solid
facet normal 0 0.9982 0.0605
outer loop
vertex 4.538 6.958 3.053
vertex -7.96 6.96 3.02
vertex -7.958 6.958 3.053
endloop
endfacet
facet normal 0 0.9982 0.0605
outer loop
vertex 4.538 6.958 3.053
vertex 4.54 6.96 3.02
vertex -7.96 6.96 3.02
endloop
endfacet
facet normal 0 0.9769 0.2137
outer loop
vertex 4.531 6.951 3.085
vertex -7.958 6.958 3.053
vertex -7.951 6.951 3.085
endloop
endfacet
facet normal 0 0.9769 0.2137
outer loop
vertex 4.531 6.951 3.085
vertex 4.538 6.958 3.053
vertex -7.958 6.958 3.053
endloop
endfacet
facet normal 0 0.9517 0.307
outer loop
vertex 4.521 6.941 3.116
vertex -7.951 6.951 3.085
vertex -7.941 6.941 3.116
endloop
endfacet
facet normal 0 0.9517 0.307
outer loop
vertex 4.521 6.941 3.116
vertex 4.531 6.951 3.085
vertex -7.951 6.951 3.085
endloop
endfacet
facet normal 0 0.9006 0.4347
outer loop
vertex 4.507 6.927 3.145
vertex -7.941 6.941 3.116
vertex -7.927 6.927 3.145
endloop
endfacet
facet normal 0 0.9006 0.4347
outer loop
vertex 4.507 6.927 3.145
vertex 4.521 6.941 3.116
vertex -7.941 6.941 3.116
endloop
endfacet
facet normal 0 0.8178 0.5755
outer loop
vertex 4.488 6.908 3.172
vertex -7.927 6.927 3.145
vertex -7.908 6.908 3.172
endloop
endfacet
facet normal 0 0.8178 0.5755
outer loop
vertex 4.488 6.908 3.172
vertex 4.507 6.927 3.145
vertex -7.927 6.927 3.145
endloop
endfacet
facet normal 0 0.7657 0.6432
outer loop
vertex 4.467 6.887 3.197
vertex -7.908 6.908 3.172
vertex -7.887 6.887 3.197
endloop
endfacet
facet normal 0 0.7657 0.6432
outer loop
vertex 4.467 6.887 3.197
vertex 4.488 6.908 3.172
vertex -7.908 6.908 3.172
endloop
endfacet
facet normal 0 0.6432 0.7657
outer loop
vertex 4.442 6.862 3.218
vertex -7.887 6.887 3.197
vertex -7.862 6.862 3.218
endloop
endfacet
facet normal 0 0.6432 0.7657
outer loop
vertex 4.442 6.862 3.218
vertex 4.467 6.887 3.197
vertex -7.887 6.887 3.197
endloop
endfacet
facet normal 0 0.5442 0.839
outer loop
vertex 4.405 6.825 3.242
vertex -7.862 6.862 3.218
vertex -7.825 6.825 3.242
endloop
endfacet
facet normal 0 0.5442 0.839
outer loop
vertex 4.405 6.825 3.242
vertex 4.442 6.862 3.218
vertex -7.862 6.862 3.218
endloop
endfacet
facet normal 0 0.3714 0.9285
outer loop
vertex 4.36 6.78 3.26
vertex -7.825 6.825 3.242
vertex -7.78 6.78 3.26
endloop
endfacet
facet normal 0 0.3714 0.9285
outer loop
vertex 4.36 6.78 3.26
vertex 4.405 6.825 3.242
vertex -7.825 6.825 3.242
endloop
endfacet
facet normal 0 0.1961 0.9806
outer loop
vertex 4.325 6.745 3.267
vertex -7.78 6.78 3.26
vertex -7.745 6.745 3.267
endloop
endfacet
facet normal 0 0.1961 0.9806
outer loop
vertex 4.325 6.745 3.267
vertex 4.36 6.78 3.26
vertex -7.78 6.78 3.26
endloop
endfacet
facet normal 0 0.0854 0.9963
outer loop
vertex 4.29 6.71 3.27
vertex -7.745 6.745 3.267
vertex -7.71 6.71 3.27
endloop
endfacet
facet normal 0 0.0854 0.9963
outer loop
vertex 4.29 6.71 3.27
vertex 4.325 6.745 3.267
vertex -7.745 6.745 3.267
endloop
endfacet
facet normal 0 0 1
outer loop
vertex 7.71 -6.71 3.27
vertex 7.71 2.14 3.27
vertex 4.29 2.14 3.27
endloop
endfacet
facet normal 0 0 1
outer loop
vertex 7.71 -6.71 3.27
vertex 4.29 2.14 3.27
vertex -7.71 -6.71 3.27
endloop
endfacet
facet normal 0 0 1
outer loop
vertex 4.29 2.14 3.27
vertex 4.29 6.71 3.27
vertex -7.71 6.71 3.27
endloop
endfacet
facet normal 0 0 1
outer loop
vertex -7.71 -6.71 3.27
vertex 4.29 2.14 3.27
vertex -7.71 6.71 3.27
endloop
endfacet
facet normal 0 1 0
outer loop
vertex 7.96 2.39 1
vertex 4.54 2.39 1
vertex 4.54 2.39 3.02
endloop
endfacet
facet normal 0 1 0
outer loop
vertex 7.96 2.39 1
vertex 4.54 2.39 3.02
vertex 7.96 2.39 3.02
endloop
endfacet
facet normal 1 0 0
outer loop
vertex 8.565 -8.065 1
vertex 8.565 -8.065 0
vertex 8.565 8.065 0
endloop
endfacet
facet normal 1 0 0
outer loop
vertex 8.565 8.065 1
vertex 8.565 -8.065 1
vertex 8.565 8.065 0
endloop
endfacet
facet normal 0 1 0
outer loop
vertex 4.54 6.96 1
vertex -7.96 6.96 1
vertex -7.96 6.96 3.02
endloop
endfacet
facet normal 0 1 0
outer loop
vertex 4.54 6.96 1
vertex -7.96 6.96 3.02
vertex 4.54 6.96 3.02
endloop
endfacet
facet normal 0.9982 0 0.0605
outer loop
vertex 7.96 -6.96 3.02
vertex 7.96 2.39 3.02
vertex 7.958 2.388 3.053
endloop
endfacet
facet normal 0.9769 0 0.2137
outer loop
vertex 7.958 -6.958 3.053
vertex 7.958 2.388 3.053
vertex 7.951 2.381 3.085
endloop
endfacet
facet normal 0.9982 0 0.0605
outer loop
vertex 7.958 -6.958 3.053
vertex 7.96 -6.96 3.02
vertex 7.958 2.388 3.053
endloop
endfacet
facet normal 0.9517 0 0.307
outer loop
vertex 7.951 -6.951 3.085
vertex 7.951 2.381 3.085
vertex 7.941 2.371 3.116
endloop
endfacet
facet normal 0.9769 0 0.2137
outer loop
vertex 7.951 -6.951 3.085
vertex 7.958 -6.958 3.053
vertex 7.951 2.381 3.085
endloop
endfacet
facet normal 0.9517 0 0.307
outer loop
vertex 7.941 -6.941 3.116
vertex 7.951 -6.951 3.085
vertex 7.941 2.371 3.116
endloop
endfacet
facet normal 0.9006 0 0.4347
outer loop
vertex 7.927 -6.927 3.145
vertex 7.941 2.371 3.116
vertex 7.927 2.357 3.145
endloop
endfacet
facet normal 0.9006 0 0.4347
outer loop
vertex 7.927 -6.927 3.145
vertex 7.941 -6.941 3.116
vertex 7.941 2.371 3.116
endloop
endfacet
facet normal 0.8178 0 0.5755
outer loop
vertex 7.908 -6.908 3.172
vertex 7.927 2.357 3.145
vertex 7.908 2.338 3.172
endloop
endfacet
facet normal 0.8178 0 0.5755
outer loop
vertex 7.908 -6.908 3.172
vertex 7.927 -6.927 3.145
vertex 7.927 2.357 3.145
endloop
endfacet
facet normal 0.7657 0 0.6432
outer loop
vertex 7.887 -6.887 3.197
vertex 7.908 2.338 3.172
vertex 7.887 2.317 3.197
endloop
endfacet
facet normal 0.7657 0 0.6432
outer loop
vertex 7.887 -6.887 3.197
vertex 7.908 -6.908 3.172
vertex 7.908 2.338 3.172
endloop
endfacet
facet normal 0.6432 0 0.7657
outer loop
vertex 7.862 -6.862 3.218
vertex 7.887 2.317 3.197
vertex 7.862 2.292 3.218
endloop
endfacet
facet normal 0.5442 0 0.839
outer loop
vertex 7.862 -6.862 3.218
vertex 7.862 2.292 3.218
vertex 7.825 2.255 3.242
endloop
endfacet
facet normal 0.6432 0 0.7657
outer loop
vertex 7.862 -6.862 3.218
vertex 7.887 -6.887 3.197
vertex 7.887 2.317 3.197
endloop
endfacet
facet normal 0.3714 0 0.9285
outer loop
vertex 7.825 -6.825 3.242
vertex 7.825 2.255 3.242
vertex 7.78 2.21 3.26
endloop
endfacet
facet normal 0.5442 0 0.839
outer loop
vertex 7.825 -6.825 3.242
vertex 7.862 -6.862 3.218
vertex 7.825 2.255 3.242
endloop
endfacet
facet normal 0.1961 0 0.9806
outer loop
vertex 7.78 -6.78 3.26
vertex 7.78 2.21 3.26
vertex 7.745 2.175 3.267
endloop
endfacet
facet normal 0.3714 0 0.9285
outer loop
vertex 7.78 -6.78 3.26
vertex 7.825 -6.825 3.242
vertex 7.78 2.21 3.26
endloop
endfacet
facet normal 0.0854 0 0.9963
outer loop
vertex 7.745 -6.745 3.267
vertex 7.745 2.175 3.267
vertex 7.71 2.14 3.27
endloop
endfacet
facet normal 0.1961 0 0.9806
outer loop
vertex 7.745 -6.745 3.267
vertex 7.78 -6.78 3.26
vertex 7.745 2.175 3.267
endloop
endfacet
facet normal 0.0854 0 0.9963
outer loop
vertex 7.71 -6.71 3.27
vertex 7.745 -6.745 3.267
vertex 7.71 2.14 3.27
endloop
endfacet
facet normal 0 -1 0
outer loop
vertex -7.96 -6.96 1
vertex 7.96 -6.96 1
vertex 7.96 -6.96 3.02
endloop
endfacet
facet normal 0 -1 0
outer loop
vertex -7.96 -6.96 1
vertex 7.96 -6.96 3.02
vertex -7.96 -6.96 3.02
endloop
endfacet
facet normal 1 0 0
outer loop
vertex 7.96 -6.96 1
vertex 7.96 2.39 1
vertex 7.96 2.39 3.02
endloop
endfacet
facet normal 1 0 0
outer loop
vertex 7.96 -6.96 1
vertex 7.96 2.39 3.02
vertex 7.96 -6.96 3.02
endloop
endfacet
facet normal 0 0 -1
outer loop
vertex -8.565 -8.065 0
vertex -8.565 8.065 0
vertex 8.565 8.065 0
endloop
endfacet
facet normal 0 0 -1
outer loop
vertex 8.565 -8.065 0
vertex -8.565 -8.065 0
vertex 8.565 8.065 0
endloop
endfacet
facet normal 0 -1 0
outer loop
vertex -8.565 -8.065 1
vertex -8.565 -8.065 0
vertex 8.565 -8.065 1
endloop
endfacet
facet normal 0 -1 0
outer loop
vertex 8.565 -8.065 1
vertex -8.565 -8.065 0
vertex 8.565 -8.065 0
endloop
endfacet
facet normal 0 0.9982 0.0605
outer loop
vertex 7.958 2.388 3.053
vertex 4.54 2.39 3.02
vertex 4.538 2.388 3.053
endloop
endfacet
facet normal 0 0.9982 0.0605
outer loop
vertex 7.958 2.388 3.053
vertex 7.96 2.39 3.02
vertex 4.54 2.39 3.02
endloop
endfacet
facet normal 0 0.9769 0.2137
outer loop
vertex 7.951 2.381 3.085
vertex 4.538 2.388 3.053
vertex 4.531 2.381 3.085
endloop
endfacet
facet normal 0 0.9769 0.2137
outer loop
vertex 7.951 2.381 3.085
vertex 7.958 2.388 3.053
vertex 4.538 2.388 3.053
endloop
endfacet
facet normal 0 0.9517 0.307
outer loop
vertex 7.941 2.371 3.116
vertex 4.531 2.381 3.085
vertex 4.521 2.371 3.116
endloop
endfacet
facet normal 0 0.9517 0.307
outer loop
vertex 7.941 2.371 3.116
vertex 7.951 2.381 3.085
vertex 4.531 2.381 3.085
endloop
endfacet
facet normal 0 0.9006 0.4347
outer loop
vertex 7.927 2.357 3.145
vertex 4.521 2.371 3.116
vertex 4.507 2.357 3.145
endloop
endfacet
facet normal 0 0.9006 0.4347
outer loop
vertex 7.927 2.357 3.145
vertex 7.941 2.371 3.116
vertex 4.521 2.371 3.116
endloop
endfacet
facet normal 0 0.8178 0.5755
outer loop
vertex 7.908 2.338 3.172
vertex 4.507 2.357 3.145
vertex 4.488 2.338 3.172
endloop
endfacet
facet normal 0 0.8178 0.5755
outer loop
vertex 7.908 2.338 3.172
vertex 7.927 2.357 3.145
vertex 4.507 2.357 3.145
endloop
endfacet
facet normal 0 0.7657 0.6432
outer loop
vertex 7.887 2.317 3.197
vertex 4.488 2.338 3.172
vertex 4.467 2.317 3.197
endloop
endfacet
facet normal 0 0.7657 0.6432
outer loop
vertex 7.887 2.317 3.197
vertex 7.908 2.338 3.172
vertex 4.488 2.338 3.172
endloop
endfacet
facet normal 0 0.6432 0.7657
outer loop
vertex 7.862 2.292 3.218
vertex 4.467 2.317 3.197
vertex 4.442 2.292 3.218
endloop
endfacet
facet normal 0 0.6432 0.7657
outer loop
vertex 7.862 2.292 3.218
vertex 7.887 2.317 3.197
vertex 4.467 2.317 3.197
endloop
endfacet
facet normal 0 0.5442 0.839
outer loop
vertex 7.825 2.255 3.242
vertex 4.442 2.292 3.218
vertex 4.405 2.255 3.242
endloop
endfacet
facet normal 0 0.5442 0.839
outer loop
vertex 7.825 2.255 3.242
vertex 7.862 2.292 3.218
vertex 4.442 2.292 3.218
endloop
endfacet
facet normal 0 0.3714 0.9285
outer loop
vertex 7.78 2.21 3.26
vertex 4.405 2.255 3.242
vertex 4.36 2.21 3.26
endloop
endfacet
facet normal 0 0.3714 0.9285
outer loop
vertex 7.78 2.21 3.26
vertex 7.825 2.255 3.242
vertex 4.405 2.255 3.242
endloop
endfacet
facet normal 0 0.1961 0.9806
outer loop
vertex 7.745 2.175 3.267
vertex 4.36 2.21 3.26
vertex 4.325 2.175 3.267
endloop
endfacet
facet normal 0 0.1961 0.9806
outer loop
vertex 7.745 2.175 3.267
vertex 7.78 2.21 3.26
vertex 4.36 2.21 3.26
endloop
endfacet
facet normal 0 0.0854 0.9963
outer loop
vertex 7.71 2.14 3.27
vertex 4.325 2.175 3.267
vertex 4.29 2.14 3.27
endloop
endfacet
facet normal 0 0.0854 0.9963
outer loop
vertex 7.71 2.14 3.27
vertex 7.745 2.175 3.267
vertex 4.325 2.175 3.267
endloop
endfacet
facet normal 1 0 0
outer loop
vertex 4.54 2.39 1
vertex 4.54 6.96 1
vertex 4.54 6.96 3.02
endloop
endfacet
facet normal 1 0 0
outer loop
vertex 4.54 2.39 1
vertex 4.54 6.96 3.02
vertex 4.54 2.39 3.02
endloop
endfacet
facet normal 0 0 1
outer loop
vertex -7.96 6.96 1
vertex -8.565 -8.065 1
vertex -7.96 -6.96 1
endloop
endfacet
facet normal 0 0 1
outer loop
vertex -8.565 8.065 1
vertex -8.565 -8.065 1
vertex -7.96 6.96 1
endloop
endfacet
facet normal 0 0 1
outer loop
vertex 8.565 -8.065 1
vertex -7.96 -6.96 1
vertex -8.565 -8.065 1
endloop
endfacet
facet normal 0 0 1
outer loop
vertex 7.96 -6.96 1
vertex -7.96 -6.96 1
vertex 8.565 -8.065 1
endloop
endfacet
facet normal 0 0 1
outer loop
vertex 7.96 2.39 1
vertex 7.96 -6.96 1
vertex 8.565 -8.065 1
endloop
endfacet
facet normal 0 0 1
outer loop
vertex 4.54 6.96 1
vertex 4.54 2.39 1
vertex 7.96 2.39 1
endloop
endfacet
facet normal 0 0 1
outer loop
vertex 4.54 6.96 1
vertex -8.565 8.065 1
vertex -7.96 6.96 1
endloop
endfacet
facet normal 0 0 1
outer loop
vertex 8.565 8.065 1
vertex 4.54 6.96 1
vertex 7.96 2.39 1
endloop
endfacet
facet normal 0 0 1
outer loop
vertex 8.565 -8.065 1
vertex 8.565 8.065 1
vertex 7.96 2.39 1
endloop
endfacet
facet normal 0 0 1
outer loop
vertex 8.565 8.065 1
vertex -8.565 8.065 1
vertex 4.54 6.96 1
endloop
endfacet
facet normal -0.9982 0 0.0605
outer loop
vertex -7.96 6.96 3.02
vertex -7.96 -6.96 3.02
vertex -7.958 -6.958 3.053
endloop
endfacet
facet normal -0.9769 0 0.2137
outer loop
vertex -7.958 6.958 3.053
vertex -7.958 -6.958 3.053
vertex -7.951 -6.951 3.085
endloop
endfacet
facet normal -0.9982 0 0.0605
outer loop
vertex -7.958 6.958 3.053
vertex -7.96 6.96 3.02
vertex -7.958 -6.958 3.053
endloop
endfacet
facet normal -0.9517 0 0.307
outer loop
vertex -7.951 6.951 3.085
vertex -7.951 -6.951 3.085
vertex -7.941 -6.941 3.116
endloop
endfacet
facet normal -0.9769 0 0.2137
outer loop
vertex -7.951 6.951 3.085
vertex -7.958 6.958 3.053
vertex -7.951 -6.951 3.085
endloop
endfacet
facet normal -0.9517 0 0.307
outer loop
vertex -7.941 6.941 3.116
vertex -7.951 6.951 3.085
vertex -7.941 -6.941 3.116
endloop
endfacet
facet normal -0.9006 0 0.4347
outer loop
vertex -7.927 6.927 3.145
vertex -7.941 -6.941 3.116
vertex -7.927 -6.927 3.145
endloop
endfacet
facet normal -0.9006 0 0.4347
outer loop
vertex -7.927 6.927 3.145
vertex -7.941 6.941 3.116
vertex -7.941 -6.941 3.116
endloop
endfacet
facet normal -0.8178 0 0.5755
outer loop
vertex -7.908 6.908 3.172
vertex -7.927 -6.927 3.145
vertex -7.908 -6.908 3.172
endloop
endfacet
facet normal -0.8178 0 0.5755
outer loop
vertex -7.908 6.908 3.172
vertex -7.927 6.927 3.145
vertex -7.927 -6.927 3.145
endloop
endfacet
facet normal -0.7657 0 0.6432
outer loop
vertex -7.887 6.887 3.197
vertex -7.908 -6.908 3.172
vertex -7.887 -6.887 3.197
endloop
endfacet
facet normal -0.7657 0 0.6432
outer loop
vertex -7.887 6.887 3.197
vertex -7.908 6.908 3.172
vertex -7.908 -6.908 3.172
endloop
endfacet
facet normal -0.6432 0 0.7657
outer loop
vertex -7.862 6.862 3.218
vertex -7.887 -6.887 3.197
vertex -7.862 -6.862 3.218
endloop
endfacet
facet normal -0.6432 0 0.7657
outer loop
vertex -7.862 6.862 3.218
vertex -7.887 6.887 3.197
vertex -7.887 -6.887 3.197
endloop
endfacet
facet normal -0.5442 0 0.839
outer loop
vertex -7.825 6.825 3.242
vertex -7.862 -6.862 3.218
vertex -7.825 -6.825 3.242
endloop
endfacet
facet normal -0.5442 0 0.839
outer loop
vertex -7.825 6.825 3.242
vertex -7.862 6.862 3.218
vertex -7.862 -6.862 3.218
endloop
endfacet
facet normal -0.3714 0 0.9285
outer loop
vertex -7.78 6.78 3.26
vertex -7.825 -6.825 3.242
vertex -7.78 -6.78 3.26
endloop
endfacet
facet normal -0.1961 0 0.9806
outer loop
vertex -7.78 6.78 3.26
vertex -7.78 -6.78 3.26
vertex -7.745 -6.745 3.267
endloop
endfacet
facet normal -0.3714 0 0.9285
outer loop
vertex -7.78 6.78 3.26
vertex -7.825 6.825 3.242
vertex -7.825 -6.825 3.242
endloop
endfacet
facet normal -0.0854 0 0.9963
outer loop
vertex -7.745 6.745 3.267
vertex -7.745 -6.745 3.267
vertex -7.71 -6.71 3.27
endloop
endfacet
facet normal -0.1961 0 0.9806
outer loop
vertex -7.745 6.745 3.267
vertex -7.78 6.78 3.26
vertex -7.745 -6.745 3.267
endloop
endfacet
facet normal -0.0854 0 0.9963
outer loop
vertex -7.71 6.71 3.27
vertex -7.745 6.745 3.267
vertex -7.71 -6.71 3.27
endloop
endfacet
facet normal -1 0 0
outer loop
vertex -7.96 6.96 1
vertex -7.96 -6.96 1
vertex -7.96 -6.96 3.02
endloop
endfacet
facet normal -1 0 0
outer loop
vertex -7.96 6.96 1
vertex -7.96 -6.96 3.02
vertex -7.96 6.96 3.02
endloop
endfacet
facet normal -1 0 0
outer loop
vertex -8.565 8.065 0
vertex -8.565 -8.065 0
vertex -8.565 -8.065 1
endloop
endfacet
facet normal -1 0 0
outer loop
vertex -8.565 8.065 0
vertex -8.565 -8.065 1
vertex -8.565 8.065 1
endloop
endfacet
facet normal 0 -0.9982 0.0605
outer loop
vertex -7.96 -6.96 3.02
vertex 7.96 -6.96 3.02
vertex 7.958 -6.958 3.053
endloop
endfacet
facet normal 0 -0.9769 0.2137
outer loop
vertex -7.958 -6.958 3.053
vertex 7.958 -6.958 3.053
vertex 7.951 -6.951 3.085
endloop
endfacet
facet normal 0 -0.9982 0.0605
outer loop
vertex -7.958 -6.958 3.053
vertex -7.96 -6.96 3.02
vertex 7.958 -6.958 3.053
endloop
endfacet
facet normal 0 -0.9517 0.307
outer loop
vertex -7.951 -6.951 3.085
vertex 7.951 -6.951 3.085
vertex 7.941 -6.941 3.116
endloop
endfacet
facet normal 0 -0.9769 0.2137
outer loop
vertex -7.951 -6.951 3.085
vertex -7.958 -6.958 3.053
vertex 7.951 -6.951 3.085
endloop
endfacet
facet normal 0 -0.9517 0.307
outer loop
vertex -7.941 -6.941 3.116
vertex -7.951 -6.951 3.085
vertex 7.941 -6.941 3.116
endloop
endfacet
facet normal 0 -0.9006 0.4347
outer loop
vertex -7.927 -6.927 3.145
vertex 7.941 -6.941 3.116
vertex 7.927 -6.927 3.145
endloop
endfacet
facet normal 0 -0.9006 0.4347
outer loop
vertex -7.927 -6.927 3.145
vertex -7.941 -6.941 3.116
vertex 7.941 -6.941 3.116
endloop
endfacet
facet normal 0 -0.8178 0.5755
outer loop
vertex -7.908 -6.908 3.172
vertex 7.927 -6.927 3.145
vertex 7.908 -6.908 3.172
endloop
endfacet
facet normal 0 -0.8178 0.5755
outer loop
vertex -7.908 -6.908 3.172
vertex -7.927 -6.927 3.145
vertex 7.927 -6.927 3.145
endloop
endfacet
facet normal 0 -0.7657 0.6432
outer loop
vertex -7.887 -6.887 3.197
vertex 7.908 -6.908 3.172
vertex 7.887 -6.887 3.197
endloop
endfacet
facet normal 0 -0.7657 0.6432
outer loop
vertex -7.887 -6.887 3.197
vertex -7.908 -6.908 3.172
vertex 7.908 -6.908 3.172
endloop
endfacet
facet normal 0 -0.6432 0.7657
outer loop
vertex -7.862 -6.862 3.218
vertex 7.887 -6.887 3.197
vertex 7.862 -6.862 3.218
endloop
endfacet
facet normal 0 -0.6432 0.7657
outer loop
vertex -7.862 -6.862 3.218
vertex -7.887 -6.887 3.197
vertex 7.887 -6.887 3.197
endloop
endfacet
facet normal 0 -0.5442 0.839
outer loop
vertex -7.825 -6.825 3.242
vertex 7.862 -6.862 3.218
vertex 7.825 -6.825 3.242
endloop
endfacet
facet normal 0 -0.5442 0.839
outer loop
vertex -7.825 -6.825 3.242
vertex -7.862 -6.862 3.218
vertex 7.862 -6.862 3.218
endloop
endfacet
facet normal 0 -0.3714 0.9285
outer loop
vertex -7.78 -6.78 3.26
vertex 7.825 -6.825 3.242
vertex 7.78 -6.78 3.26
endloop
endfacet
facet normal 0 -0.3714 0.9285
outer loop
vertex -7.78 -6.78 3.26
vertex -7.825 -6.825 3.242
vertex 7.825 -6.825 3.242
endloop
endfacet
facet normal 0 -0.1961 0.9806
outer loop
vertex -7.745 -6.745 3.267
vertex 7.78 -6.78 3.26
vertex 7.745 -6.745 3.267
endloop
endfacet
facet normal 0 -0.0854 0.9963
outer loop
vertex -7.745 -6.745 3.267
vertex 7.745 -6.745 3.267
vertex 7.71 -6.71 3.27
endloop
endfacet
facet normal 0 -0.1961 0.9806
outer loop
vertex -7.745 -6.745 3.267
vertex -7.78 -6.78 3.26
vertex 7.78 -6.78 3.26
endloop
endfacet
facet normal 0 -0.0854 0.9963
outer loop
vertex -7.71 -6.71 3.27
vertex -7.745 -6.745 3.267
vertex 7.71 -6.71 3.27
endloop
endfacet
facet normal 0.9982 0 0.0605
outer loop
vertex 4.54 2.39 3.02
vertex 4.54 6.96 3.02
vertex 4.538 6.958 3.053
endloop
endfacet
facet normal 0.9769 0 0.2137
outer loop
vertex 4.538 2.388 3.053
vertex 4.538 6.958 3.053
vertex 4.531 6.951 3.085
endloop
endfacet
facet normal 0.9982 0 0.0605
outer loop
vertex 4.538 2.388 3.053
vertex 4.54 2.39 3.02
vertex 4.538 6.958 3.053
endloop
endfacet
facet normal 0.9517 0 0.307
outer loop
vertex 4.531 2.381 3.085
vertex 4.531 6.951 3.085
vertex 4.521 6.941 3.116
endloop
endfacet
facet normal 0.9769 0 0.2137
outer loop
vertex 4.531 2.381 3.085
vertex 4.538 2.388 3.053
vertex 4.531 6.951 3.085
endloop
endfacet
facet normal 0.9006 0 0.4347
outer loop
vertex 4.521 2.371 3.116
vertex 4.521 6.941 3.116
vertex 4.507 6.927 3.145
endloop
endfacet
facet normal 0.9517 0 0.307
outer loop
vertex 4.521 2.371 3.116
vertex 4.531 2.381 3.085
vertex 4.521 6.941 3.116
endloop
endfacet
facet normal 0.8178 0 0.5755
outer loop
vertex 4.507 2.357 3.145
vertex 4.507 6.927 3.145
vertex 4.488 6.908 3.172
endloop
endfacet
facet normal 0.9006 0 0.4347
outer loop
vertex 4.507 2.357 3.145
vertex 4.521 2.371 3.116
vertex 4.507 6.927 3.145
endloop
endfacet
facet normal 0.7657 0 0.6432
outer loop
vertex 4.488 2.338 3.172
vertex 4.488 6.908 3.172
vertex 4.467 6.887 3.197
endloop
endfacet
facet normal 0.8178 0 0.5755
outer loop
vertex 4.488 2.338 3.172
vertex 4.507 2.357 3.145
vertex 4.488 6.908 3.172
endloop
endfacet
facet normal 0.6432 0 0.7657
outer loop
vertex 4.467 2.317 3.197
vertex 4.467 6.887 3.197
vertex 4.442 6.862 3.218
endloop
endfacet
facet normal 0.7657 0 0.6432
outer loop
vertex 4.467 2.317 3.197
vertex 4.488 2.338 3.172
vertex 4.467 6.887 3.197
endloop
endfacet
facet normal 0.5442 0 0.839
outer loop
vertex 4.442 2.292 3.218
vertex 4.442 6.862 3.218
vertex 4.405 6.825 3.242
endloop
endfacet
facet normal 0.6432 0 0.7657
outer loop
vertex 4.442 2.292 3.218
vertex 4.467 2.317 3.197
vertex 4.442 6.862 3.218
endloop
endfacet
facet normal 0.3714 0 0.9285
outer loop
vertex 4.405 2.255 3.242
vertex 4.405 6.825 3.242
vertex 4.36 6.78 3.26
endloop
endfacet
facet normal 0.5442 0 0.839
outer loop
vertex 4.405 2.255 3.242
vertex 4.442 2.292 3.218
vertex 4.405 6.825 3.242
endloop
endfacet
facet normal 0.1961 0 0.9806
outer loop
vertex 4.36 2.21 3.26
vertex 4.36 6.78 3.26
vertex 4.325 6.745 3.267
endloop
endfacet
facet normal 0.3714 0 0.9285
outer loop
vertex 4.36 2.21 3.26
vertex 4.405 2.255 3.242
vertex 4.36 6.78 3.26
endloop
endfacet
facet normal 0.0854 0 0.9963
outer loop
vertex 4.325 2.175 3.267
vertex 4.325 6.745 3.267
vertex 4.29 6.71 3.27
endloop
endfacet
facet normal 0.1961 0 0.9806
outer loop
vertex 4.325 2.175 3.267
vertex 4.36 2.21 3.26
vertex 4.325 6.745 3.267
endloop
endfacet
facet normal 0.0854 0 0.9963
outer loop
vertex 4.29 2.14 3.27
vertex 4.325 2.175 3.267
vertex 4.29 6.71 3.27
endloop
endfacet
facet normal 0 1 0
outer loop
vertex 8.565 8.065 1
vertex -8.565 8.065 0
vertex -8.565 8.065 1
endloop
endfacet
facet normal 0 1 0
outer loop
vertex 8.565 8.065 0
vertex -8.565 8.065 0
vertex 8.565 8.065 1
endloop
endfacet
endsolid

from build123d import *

# Parameters (mm, degrees)
SKETCH_1_W      = 17.13
SKETCH_1_H      = 16.13
EXTRUDE_1_DEPTH = 1
EXTRUDE_2_DEPTH = 2.27
FILLET_1_R      = 0.25


with BuildPart() as part:
    # Эскиз1 → Бобышка-Вытянуть1 (new body)
    with BuildSketch(Plane.XY):
        Rectangle(SKETCH_1_W, SKETCH_1_H)
    extrude(amount=EXTRUDE_1_DEPTH)

    # Эскиз2 → Бобышка-Вытянуть2 (add)
    with BuildSketch(Plane.XY.offset(1)):
        Polygon((4.54, 6.96), (4.54, 2.39), (7.96, 2.39), (7.96, -6.96), (-7.96, -6.96), (-7.96, 6.96), align=None)
    extrude(amount=EXTRUDE_2_DEPTH)

    # Скругление1
    fillet_1_edges = [part.edges().sort_by_distance(p)[0] for p in [
        (-7.96, 0, 3.27),
        (0, -6.96, 3.27),
        (7.96, -2.285, 3.27),
        (6.25, 2.39, 3.27),
        (4.54, 4.675, 3.27),
        (-1.71, 6.96, 3.27),
    ]]
    fillet(fillet_1_edges, radius=FILLET_1_R)


solid = part.part
